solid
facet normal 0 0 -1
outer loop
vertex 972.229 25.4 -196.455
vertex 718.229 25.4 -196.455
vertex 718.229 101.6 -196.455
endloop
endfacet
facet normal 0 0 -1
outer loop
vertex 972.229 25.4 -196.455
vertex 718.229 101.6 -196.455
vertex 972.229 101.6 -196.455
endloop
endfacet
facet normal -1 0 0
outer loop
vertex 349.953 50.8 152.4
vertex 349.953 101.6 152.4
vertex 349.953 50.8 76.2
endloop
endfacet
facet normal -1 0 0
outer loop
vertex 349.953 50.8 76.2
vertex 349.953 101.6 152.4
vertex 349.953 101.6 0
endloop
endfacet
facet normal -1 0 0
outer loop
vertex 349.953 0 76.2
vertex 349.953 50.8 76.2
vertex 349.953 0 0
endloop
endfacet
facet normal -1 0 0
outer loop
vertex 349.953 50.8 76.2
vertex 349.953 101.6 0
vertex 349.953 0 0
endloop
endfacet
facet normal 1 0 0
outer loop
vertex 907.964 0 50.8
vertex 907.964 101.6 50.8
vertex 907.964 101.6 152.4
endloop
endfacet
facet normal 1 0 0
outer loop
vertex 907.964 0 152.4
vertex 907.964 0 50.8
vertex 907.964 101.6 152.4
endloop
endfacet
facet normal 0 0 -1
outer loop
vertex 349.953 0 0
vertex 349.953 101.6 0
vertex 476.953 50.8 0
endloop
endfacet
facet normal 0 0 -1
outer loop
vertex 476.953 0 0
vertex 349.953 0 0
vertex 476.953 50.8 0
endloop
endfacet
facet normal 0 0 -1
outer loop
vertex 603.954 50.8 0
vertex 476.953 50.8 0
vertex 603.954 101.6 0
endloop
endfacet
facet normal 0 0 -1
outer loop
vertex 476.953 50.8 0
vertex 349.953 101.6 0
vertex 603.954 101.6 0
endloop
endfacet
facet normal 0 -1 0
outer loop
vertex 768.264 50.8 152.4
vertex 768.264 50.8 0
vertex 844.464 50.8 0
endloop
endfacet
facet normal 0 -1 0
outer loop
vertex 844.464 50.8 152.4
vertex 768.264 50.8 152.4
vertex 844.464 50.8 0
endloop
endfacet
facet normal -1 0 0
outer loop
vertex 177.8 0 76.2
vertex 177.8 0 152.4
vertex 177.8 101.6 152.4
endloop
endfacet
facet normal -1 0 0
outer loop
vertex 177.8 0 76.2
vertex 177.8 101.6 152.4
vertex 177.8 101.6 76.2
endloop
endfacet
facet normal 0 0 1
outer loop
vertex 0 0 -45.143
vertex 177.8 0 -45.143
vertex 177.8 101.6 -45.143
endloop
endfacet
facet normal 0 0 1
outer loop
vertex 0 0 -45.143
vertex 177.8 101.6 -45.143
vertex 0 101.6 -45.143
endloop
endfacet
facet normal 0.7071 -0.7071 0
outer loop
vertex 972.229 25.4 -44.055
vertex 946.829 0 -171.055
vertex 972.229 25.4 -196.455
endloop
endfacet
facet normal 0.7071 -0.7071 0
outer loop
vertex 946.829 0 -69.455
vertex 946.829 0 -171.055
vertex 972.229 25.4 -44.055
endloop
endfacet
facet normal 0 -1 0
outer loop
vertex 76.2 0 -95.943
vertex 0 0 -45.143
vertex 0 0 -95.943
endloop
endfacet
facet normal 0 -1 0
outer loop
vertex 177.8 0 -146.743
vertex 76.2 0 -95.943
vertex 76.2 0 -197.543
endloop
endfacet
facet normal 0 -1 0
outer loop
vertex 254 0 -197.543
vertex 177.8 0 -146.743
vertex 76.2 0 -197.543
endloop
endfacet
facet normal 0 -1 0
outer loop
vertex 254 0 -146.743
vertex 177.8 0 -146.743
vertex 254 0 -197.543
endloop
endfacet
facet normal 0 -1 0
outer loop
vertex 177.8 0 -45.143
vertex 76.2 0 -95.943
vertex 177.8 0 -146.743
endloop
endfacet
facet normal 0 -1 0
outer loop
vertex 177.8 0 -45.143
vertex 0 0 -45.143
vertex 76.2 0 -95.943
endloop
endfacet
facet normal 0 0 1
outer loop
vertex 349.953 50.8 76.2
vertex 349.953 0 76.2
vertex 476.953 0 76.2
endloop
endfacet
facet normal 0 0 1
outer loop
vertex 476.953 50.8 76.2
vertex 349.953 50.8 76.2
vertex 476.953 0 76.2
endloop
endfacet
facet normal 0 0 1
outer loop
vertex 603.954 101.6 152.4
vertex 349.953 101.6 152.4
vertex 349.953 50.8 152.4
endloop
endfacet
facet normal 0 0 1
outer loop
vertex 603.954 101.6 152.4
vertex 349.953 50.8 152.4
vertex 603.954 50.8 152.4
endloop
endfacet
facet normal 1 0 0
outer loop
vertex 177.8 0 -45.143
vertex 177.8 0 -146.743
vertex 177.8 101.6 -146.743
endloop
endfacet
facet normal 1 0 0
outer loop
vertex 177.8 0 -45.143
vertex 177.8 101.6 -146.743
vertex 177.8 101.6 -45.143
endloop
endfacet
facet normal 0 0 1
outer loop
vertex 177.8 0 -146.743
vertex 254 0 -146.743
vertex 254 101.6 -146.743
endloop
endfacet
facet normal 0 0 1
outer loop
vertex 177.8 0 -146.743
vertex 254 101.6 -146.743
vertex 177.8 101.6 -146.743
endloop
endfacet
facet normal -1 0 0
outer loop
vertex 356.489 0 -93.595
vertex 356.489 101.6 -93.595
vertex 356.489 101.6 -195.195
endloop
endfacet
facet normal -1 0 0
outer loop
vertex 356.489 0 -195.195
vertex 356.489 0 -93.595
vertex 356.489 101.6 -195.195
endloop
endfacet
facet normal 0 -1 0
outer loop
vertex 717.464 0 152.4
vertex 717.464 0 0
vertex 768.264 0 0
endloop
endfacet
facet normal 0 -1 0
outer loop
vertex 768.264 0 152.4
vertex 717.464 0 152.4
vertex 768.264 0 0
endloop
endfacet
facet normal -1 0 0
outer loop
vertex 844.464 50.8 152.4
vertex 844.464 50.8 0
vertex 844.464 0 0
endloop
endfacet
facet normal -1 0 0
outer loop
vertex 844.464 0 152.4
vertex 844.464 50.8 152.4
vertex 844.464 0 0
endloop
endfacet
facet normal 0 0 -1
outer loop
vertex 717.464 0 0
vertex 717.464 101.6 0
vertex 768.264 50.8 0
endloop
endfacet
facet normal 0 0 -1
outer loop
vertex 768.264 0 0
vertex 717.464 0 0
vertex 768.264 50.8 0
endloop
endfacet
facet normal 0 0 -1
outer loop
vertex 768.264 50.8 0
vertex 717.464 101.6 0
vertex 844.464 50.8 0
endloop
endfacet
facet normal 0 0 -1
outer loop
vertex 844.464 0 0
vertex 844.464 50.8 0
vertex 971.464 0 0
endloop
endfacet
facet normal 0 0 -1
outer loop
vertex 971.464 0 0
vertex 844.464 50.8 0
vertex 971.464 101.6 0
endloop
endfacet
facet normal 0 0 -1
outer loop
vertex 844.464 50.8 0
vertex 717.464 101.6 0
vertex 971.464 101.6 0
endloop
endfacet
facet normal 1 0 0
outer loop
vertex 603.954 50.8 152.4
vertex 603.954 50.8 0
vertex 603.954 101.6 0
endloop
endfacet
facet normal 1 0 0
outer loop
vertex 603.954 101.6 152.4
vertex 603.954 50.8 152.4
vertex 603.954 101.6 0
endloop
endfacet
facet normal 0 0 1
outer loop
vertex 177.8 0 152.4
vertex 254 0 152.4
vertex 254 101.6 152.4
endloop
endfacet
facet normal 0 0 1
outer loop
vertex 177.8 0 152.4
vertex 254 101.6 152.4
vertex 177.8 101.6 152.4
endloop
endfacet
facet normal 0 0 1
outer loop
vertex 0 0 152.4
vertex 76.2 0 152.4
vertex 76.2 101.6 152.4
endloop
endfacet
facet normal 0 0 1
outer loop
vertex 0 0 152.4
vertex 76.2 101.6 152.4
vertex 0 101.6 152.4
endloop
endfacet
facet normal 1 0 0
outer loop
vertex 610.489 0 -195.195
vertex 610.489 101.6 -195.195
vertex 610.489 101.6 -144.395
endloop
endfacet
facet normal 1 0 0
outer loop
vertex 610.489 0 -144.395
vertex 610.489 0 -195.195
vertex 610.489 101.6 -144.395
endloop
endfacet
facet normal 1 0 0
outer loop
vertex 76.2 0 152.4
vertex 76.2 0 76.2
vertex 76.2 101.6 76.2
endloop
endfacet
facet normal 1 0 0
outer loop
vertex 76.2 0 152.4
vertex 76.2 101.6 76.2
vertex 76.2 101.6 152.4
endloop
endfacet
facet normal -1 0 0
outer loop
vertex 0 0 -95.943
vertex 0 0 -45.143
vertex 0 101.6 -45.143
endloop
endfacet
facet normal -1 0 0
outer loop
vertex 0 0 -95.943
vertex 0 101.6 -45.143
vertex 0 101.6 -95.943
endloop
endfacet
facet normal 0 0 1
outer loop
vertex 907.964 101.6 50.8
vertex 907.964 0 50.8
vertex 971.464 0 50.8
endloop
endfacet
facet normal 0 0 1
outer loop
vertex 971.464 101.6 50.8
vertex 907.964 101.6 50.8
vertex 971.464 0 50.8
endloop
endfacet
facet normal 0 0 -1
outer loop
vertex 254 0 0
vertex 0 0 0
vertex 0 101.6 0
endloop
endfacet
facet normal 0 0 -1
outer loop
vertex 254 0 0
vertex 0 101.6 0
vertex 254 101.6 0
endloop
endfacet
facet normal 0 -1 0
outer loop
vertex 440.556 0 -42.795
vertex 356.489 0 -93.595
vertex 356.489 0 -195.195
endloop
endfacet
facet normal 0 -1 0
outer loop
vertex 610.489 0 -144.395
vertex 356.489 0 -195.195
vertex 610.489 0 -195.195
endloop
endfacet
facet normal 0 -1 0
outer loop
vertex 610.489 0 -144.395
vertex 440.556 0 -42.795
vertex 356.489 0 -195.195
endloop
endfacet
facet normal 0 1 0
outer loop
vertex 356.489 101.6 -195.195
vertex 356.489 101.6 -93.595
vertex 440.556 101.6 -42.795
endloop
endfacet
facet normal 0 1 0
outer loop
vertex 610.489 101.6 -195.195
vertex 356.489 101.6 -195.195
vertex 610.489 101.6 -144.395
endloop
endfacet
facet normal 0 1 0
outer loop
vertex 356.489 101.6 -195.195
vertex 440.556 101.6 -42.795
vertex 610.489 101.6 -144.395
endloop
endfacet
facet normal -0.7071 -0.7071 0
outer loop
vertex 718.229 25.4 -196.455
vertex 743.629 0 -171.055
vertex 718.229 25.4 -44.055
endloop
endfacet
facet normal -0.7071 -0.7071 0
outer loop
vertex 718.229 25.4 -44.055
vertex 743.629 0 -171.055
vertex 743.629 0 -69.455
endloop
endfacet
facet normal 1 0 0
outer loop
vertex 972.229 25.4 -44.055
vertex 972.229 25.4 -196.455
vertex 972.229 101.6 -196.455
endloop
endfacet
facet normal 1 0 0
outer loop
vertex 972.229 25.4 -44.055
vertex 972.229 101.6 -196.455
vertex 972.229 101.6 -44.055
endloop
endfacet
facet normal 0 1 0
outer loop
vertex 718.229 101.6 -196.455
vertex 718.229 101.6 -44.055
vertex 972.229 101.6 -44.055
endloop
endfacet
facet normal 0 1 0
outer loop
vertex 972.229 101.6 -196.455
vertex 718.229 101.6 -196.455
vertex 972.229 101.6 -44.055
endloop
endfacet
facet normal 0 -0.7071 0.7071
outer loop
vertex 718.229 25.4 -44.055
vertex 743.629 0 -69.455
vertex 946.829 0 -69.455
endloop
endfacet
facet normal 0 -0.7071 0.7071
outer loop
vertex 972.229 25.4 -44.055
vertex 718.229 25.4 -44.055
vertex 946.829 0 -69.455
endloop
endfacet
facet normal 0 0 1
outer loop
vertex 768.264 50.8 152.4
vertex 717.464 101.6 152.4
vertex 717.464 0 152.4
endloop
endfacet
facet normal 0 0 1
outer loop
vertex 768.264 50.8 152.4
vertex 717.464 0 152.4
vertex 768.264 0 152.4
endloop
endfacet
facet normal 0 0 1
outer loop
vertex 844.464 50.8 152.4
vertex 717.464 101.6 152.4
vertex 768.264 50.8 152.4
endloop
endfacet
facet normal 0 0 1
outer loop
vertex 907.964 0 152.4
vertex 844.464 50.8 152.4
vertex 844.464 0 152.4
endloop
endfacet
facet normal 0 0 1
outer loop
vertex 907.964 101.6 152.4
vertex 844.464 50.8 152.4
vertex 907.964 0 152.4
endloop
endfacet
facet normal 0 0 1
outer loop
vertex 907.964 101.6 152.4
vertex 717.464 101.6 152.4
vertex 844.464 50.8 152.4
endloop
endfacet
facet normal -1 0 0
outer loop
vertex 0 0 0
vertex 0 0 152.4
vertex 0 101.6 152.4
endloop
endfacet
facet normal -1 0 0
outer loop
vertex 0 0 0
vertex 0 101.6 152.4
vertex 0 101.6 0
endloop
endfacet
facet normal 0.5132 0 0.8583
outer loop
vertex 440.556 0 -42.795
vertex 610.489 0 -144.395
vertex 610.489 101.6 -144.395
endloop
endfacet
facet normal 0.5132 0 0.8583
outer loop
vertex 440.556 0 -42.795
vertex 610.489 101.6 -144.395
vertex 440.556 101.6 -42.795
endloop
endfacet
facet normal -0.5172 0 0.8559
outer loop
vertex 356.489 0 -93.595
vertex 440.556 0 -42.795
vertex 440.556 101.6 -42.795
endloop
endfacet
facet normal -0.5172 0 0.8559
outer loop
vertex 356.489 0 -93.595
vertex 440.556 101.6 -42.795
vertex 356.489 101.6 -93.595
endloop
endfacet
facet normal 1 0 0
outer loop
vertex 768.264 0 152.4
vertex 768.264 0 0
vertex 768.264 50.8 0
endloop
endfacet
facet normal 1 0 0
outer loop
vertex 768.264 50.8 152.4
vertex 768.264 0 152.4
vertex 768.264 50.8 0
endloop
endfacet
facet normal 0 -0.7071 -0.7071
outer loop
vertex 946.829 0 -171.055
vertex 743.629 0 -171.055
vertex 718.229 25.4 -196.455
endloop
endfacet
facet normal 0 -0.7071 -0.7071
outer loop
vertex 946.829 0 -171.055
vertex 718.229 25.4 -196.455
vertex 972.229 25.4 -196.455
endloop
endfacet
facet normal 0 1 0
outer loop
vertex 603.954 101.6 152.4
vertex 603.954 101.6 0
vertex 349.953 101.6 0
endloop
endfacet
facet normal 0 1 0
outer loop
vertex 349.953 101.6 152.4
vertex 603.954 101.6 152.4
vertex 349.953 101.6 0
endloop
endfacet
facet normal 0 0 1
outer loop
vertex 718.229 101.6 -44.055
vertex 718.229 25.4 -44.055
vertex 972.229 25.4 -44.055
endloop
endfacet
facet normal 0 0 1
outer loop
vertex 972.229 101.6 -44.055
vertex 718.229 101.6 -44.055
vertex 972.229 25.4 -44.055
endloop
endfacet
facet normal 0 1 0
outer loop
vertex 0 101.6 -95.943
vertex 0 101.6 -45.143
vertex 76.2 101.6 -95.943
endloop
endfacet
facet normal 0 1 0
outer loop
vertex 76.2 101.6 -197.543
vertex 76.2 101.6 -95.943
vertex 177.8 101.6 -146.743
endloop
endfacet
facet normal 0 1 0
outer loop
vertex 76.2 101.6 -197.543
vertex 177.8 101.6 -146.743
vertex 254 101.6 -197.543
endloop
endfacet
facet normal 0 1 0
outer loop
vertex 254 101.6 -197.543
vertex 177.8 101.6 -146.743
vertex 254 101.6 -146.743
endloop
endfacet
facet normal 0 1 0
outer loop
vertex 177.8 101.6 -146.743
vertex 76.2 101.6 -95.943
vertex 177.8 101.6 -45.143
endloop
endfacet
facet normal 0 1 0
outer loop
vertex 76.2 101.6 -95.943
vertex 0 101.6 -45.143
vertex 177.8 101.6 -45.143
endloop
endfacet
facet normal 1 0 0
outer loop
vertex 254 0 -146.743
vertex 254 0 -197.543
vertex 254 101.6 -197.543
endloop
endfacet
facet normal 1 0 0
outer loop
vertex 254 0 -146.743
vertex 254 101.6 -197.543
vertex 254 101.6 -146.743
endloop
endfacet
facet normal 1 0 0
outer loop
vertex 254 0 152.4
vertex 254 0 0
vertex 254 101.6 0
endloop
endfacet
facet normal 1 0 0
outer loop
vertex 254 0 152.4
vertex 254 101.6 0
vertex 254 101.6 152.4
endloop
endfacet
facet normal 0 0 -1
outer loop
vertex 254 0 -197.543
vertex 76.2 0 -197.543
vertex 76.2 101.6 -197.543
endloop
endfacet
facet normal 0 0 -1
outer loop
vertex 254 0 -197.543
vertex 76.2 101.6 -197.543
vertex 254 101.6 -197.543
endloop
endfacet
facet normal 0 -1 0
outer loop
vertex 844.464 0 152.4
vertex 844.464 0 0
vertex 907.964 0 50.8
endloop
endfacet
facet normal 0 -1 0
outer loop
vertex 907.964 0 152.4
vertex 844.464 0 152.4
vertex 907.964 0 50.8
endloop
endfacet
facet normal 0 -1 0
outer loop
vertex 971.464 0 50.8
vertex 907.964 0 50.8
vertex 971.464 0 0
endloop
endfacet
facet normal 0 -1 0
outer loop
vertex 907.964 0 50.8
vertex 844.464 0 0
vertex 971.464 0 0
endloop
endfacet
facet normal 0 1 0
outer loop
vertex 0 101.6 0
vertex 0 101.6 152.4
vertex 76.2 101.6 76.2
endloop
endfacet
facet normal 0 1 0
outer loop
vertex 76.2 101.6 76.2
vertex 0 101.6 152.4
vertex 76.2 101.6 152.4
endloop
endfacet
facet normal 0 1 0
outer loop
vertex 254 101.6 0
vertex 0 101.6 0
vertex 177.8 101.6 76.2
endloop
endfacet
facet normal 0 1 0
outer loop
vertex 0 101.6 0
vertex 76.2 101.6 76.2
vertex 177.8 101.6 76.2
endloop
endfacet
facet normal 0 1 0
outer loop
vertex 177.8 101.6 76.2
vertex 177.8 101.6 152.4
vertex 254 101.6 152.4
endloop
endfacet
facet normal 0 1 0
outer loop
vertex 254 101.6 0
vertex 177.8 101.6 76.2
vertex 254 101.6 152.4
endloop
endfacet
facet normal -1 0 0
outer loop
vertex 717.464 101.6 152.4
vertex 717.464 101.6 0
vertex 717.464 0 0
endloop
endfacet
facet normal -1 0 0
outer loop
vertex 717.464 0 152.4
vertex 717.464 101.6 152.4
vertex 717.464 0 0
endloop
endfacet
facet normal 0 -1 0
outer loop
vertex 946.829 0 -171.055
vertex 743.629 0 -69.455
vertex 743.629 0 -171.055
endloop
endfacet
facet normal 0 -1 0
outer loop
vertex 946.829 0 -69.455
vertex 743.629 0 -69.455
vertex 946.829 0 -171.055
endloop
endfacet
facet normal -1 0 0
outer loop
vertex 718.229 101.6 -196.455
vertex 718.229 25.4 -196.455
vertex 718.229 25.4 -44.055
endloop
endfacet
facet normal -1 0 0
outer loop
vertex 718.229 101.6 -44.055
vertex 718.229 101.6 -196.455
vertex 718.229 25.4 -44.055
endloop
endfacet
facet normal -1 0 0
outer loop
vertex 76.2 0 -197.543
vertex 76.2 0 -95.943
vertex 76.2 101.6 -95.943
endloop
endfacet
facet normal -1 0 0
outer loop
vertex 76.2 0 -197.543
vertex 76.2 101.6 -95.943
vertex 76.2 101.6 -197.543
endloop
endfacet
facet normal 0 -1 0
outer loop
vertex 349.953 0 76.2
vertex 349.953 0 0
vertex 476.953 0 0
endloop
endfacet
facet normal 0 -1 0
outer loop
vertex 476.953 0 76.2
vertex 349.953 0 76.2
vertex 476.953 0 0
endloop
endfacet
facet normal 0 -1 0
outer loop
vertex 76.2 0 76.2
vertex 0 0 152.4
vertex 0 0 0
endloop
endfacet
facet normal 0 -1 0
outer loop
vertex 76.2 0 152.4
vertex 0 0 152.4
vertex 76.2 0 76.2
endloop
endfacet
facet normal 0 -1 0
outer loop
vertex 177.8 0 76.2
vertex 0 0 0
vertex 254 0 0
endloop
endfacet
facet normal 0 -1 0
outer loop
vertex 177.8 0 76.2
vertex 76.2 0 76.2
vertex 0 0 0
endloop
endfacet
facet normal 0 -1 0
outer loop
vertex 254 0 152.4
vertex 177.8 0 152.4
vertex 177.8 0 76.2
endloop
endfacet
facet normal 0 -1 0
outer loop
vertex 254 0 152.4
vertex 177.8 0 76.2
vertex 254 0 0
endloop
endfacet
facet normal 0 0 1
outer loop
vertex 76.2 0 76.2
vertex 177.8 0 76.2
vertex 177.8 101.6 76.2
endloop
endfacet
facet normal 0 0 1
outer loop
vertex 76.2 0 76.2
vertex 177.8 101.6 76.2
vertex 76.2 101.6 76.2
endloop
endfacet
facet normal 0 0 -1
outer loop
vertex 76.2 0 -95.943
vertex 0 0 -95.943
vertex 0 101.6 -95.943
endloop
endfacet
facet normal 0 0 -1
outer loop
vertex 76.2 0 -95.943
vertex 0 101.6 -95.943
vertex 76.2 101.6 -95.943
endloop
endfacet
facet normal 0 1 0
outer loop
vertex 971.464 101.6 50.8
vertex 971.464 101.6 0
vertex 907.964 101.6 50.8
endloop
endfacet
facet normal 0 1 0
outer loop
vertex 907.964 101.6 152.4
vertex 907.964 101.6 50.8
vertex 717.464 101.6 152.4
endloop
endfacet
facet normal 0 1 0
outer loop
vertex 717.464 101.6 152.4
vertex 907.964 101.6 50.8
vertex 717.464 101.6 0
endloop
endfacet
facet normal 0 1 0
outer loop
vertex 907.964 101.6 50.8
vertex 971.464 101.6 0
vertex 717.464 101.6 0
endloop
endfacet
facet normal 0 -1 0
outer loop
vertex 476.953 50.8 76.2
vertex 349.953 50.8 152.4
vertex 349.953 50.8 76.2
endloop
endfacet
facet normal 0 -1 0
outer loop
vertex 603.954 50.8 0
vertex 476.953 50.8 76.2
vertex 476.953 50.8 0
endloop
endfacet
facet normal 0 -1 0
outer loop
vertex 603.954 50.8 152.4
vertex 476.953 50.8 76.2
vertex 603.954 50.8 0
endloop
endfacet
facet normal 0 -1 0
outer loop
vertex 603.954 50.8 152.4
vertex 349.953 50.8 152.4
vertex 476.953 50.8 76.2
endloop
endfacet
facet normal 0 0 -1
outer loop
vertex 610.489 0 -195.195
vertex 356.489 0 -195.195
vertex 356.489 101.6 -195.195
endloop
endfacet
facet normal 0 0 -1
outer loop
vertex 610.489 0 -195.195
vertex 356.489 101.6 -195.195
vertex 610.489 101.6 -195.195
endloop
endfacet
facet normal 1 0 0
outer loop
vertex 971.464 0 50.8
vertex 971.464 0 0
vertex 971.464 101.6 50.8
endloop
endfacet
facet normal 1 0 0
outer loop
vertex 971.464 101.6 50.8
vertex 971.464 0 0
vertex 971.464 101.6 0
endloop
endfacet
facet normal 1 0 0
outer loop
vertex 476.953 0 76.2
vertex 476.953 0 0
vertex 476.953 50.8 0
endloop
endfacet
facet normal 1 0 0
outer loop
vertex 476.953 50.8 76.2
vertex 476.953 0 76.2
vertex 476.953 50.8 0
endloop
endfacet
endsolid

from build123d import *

# Parameters (mm, degrees)
F1_DEPTH  = 101.6
F3_DEPTH  = 152.4
F4_W      = 127
F4_H      = 76.2
F5_DEPTH  = 50.8
F6_DEPTH  = 50.8
F8_DEPTH  = 152.4
F9_W      = 63.5
F9_H      = 101.6
F10_DEPTH = 101.6
F12_DEPTH = 101.6
F14_DEPTH = 101.6
F15_W     = 254
F15_H     = 152.4
F16_DEPTH = 101.6
F17_SIZE  = 25.4


with BuildPart() as f1:
    # F0 (on Front) → F1 (new body)
    with BuildSketch(Plane.XZ):
        Polygon((0, 152.4), (0, 0), (254, 0), (254, 152.4), (177.8, 152.4), (177.8, 76.2), (76.2, 76.2), (76.2, 152.4), align=None)
    extrude(amount=-F1_DEPTH)


with BuildPart() as f3:
    # F2 (on Top) → F3 (new body)
    with BuildSketch(Plane.XY):
        Polygon((603.953785, 101.6), (349.952871, 101.6), (349.952871, 0), (476.952871, 0), (476.952871, 50.8), (603.953785, 50.8), align=None)
    extrude(amount=F3_DEPTH)

    # F4 (on face) → F5 (join)
    with BuildSketch(Plane.XZ):
        with Locations((413.452871, 114.3)):
            Rectangle(F4_W, F4_H)
    extrude(amount=-F5_DEPTH)

    # F4 (on face) → F6 (cut)
    with BuildSketch(Plane.XZ):
        with Locations((413.452871, 114.3)):
            Rectangle(F4_W, F4_H)
    extrude(amount=-F6_DEPTH, mode=Mode.SUBTRACT)


with BuildPart() as f8:
    # F7 (on Top) → F8 (new body)
    with BuildSketch(Plane.XY):
        Polygon((971.464483, 101.6), (717.464483, 101.6), (717.464483, 0), (768.264483, 0), (768.264483, 50.8), (844.464483, 50.8), (844.464483, 0), (971.464483, 0), align=None)
    extrude(amount=F8_DEPTH)

    # F9 (on face) → F10 (cut)
    with BuildSketch(Plane.XZ):
        with Locations((939.714483, 101.6)):
            Rectangle(F9_W, F9_H)
    extrude(amount=-F10_DEPTH, mode=Mode.SUBTRACT)


with BuildPart() as f12:
    # F11 (on Front) → F12 (new body)
    with BuildSketch(Plane.XZ):
        Polygon((177.8, -45.143463), (0, -45.143463), (0, -95.943463), (76.2, -95.943463), (76.2, -197.543463), (254, -197.543463), (254, -146.743463), (177.8, -146.743463), align=None)
    extrude(amount=-F12_DEPTH)


with BuildPart() as f14:
    # F13 (on Front) → F14 (new body)
    with BuildSketch(Plane.XZ):
        Polygon((356.488807, -93.595416), (356.488807, -195.195416), (610.488807, -195.195416), (610.488807, -144.395416), (440.555629, -42.795416), align=None)
    extrude(amount=-F14_DEPTH)


with BuildPart() as f16:
    # F15 (on Front) → F16 (new body)
    with BuildSketch(Plane.XZ):
        with Locations((845.228612, -120.254754)):
            Rectangle(F15_W, F15_H)
    extrude(amount=-F16_DEPTH)

    # F17
    f17_edges = [f16.edges().sort_by_distance(p)[0] for p in [
        (845.228612, 0, -196.454754),
        (972.228612, 0, -120.254754),
        (845.228612, 0, -44.054754),
        (718.228612, 0, -120.254754),
    ]]
    chamfer(f17_edges, length=F17_SIZE)


solid = Compound([f1.part, f3.part, f8.part, f12.part, f14.part, f16.part])
